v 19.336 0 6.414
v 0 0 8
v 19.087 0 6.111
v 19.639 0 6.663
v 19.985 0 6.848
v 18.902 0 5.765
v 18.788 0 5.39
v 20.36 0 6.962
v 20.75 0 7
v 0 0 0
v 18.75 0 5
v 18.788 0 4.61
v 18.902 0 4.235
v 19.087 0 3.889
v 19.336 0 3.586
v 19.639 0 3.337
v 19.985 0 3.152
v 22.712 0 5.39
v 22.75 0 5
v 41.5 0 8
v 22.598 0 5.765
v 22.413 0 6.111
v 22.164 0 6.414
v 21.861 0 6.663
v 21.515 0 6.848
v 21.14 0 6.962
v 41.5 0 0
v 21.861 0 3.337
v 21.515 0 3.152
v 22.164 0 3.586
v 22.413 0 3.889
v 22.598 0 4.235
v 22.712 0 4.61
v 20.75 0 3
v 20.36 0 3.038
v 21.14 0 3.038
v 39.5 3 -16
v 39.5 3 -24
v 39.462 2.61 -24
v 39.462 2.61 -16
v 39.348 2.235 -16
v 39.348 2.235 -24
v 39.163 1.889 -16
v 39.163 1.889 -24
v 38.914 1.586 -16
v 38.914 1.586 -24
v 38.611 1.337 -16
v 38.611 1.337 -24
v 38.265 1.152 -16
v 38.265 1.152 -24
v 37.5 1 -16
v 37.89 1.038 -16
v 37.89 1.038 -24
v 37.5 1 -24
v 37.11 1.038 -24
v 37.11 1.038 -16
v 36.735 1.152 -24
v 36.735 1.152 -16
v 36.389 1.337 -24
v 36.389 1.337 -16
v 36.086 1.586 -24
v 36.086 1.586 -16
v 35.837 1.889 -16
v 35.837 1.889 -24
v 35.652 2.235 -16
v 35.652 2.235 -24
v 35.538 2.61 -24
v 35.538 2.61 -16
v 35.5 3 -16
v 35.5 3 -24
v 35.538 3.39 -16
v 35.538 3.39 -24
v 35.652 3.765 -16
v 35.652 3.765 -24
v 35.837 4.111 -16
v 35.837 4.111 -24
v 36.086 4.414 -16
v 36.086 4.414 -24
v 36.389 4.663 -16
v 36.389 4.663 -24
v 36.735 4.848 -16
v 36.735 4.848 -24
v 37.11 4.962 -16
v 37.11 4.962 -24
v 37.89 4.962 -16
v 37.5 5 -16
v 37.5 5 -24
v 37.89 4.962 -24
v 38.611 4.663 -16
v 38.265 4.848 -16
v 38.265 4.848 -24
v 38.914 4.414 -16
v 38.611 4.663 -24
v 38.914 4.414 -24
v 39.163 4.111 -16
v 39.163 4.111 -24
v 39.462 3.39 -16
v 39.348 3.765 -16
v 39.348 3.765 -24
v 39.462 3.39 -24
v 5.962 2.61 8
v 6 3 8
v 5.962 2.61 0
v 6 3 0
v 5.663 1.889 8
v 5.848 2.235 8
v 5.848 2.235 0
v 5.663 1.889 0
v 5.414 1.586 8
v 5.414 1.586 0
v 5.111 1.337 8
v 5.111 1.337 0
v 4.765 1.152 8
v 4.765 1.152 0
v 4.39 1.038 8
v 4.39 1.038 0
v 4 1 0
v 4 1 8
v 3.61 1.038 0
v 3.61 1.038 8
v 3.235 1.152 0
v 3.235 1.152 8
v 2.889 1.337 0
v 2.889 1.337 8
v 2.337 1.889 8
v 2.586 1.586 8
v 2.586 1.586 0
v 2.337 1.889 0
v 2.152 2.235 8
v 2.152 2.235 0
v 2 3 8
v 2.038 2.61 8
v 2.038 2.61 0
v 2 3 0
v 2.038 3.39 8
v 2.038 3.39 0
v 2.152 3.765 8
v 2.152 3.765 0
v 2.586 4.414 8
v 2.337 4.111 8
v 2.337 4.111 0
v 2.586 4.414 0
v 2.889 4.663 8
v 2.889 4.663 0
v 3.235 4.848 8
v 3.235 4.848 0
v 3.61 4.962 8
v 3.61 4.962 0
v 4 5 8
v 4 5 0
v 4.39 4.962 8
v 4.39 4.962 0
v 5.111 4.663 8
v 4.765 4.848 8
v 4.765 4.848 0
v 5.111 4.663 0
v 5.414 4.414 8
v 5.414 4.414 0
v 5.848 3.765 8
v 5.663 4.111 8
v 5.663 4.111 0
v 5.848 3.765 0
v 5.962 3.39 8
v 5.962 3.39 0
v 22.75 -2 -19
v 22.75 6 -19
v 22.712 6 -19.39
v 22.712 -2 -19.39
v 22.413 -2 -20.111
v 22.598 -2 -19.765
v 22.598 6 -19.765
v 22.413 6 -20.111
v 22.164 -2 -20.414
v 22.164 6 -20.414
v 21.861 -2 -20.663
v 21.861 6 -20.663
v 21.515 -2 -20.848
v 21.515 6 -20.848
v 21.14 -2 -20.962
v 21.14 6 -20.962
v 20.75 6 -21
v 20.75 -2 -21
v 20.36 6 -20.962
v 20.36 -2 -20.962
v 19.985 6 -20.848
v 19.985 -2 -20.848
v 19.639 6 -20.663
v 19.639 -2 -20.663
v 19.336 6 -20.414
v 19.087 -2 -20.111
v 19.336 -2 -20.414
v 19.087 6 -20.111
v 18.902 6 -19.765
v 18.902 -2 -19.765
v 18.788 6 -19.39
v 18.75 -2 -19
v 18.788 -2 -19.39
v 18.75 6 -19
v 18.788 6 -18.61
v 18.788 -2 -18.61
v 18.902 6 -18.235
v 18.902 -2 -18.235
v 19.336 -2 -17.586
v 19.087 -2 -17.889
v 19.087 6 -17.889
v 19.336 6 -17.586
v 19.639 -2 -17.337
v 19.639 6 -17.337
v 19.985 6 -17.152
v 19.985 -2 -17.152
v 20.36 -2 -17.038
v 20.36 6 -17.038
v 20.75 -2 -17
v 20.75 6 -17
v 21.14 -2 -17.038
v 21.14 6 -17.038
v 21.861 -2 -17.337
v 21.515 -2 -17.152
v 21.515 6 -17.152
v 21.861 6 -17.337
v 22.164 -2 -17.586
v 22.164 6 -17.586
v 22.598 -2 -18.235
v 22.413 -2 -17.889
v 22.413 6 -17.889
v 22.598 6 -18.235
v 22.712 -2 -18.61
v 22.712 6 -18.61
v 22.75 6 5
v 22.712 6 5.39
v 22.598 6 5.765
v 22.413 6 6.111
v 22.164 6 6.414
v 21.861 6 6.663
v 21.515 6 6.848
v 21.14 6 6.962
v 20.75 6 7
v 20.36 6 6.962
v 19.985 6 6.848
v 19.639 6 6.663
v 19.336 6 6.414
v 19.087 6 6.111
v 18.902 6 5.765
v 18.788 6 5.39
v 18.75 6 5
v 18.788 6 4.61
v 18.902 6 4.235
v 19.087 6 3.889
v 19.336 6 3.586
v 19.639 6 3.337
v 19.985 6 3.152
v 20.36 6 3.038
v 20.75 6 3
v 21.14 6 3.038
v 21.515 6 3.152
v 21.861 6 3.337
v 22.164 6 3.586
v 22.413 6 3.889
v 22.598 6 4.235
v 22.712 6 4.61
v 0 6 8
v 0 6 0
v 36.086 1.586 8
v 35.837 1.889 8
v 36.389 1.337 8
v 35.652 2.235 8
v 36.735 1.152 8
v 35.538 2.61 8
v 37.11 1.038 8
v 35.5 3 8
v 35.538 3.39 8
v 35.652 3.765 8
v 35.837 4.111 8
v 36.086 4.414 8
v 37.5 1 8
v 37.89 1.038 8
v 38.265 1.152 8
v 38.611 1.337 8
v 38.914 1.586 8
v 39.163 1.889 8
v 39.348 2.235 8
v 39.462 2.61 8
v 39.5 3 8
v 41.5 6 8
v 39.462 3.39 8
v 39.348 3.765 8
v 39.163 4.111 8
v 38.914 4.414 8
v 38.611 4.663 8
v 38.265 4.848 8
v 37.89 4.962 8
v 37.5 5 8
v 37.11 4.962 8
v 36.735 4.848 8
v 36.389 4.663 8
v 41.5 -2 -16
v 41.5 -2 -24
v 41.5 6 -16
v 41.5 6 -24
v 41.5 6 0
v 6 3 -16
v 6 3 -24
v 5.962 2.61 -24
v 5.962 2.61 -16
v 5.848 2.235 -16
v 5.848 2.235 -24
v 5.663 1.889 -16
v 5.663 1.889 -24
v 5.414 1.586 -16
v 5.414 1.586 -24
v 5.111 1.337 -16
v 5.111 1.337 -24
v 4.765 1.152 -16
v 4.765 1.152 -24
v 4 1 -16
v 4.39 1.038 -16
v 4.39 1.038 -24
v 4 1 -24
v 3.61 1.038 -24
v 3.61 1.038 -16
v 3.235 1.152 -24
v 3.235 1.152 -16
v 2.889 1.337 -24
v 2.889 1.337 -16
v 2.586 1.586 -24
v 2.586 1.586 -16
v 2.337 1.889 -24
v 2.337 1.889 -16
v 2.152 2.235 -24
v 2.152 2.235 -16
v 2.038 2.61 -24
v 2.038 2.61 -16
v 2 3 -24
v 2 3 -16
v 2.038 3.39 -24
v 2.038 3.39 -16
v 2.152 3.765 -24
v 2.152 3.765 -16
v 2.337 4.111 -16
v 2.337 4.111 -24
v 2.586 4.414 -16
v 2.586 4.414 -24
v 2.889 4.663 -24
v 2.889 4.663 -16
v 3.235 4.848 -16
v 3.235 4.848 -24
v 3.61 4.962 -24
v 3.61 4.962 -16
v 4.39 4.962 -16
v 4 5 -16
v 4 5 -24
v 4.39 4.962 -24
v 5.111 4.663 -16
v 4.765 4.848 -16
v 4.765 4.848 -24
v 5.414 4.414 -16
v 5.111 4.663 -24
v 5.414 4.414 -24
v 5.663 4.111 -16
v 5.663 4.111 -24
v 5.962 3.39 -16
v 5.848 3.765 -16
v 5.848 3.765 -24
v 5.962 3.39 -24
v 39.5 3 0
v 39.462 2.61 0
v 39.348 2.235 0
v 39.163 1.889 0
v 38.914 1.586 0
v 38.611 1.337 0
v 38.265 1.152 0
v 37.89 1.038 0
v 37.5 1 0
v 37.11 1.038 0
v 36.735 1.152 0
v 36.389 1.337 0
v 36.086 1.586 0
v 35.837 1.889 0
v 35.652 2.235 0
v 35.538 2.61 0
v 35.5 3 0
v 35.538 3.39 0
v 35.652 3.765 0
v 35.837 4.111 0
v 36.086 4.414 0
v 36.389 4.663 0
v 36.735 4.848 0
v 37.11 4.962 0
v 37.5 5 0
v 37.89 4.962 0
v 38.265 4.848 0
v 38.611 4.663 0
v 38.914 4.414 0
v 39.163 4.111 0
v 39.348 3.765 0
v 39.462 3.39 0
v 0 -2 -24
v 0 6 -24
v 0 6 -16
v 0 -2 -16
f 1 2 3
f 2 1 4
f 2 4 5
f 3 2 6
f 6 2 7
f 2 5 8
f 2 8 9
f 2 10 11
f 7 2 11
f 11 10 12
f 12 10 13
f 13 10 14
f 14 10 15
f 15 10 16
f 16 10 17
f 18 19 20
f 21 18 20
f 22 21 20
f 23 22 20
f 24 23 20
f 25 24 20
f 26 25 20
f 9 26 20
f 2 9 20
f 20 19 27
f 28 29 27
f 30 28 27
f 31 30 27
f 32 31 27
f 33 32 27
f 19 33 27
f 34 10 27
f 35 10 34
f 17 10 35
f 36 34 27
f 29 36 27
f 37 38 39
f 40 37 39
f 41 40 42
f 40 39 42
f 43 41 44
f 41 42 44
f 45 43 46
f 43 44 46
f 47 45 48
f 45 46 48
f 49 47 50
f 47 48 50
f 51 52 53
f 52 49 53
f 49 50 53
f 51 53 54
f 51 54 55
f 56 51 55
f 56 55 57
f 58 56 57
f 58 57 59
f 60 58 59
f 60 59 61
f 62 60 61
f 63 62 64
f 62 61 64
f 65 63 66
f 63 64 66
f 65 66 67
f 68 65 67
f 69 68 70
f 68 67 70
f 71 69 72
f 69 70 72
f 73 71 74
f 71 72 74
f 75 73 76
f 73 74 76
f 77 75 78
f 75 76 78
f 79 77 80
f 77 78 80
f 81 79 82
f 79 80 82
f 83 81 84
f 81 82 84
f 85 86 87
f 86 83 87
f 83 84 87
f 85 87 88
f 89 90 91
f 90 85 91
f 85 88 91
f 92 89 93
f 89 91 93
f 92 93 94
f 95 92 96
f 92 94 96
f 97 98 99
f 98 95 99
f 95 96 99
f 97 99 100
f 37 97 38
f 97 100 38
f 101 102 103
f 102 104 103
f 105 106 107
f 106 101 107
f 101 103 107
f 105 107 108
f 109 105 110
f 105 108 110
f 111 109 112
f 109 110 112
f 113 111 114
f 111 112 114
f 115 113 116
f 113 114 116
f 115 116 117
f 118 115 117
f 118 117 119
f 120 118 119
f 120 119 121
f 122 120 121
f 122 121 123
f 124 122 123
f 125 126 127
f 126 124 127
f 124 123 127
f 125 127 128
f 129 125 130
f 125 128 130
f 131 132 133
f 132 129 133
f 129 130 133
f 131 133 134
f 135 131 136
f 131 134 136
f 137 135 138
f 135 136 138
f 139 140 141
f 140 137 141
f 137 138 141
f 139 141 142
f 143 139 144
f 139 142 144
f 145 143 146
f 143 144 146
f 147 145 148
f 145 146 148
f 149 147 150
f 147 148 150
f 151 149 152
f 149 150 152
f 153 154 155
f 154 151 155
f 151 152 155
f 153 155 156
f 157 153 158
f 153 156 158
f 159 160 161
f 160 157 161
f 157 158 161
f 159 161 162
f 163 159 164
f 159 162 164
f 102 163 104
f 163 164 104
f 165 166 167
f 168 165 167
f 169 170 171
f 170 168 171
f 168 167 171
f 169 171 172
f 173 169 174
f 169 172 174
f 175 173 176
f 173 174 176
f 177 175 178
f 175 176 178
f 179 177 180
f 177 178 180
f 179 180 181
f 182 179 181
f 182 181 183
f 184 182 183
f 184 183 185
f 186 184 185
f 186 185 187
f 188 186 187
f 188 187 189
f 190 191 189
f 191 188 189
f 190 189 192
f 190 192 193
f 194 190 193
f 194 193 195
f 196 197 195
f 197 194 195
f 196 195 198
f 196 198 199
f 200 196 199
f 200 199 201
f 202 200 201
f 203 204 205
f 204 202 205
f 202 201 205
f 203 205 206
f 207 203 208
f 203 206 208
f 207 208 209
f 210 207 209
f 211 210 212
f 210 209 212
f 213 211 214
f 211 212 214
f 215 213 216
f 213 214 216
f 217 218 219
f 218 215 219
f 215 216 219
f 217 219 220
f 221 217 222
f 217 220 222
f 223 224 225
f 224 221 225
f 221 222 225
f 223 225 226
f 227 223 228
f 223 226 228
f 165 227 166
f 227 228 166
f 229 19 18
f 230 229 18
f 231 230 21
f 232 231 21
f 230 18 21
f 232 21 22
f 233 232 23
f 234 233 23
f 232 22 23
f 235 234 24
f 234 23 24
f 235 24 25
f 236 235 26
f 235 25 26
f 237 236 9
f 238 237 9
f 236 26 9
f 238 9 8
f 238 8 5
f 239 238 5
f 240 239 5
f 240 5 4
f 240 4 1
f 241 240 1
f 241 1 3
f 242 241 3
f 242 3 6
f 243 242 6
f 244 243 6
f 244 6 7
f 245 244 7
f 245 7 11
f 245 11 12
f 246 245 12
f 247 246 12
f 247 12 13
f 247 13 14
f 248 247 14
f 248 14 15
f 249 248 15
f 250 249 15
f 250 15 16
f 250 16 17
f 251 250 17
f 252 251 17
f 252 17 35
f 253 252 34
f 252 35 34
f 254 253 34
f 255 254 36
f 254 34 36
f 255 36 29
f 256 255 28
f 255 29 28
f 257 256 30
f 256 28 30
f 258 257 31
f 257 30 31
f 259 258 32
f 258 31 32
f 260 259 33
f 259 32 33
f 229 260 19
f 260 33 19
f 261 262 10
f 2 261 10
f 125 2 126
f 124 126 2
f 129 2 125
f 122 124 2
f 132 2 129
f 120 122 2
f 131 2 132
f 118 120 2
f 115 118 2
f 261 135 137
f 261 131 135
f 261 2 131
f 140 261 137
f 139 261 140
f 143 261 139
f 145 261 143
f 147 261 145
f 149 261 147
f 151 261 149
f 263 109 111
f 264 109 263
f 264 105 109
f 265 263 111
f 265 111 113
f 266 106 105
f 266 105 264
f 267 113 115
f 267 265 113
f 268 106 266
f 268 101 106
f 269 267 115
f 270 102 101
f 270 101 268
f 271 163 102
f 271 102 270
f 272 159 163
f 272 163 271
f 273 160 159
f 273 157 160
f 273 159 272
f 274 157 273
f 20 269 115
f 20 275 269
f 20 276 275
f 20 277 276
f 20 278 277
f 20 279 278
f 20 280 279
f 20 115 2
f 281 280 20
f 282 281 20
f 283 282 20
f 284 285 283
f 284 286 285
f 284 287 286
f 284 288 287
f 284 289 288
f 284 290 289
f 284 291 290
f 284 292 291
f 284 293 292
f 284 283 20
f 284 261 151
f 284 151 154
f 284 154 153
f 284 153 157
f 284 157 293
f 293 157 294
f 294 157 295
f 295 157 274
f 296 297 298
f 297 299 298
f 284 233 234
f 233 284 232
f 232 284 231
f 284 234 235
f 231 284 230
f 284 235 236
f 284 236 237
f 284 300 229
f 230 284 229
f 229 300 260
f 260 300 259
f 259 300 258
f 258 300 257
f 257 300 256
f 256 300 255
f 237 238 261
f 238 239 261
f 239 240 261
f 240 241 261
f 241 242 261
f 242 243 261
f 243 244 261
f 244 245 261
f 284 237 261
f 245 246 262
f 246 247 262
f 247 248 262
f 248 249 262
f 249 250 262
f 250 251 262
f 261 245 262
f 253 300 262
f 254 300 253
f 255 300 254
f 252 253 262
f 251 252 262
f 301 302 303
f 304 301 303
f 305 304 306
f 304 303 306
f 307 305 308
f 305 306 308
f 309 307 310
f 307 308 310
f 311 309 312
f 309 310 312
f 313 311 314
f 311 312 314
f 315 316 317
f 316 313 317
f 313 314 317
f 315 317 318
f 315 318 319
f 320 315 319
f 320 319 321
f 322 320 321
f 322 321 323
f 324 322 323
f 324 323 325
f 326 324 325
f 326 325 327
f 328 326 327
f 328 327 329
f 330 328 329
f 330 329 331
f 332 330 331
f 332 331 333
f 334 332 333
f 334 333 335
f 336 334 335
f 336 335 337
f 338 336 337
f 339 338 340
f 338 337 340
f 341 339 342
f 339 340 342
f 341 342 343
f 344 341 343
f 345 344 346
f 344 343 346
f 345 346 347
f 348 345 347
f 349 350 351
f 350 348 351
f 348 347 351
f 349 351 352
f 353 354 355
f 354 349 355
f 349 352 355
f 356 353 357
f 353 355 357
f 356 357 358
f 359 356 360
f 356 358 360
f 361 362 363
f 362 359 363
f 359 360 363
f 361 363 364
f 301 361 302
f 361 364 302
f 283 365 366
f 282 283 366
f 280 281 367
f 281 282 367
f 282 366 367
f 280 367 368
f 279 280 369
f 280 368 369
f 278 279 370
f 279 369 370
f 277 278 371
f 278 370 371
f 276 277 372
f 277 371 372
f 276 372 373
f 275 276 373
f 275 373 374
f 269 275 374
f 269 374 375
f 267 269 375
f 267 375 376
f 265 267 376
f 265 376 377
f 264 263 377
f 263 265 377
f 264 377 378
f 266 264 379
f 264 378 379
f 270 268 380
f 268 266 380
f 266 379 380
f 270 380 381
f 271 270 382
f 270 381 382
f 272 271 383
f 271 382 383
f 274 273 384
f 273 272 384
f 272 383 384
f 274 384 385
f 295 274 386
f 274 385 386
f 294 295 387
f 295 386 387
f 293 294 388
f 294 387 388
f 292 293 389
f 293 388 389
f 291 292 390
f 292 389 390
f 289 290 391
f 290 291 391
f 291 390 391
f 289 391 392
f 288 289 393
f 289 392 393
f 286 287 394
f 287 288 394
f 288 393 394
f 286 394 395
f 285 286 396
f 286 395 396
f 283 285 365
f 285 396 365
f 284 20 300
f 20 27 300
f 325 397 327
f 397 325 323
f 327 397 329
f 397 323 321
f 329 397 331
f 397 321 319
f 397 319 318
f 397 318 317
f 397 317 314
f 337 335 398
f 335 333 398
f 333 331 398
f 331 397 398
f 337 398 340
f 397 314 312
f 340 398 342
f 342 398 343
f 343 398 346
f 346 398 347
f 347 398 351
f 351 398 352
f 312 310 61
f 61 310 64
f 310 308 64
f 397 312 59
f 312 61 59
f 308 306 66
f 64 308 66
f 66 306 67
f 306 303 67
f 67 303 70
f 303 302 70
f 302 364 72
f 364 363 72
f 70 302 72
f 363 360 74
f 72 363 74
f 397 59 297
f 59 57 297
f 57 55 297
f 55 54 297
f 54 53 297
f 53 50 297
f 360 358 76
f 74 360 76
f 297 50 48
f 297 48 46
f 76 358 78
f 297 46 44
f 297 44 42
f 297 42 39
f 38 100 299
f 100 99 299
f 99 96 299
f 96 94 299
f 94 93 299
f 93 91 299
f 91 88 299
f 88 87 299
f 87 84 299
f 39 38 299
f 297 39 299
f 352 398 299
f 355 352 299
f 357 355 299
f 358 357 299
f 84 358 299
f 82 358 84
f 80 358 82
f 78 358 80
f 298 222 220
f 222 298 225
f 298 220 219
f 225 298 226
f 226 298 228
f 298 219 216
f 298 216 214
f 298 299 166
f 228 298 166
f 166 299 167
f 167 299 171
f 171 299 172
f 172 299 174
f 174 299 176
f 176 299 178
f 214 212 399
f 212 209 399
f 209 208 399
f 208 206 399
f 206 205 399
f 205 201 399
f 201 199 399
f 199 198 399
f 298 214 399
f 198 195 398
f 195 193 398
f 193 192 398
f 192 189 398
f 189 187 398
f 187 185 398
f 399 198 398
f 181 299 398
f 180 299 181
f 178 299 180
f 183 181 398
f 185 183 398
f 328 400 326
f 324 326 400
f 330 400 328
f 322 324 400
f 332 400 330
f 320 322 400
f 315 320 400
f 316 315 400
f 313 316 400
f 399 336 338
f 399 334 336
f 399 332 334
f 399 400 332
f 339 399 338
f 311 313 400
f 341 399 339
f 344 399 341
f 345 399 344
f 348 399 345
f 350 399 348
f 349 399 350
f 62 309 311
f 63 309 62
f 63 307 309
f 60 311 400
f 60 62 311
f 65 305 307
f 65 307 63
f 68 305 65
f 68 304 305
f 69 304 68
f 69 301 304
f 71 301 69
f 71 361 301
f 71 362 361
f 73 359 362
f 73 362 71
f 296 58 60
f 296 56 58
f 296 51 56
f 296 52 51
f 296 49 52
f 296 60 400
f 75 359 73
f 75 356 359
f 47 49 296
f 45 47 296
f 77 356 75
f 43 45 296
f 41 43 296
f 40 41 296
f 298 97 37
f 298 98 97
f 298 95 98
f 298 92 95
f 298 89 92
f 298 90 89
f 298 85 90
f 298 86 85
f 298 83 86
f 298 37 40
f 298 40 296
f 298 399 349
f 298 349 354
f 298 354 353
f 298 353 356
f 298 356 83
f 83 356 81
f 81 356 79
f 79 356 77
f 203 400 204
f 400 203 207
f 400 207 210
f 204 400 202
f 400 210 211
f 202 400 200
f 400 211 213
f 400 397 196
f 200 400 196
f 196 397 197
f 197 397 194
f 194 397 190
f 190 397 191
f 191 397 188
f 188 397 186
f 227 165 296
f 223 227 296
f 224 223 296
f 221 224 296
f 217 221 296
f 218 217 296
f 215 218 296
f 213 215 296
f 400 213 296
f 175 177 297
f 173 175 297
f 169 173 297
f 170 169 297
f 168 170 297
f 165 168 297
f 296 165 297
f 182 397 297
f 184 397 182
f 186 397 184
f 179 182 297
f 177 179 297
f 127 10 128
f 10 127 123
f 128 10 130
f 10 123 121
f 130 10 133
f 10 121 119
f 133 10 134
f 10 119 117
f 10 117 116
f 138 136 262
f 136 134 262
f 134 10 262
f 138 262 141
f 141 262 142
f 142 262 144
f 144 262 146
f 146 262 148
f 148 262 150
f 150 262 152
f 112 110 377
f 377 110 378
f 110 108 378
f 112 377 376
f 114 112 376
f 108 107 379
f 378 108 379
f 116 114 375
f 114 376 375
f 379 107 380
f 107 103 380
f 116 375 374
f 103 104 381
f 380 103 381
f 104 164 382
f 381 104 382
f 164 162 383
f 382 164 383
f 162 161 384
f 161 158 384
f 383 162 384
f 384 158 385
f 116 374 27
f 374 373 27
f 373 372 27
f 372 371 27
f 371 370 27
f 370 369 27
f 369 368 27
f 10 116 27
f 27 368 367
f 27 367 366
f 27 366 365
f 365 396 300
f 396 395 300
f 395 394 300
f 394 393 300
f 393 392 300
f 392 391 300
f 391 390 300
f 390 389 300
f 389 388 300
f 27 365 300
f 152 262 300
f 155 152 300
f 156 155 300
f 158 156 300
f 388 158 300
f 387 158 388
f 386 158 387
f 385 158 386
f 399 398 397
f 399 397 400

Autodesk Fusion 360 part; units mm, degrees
sketch "Sketch1" plane through (0, 0, 0) normal (0, 0, 1) x (1, 0, 0) in component "czniki podstawy z pokryw"
  line L0 (0, 0) -> (41.5, 0)
  line L1 (41.5, 0) -> (41.5, 6)
  line L2 (41.5, 6) -> (0, 6)
  line L3 (0, 6) -> (0, 0)
  line L4 (0, 3) -> (41.5, 3) construction
  circle A0 centre (4, 3) radius 2
  circle A1 centre (37.5, 3) radius 2
  dimension "d1" = 4
  dimension "d2" = 4
  dimension "d3" = 33.5
  dimension "d4" = 4
  dimension "d5" = 4
  dimension "d6" = 3
extrude "Extrude1" add sketch "Sketch1" along normal blind 8 makes body 1 in component "czniki podstawy z pokryw"
sketch "Sketch2" plane through (0, 0, 0) normal (0, -1, 0) x (1, 0, 0) in component "czniki podstawy z pokryw"
  line L0 (0, 0) -> (41.5, 0)
  line L1 (41.5, 0) -> (41.5, 8)
  line L2 (41.5, 8) -> (0, 8)
  line L3 (0, 8) -> (0, 0)
  line L4 (20.75, 0) -> (20.75, 8) construction
  circle A0 centre (20.75, 5) radius 2
  dimension "d9" = 4
  dimension "d10" = 5
extrude "Extrude2" cut sketch "Sketch2" against normal blind 6 contours A0 bodies 1 in component "czniki podstawy z pokryw"
sketch "Sketch1 (2)" plane through (0, 0, 0) normal (0, 0, 1) x (1, 0, 0) in component "czniki podstawy z pokryw dlurzszy"
  line L0 (0, 0) -> (41.5, 0)
  line L1 (41.5, 0) -> (41.5, 6)
  line L2 (41.5, 6) -> (0, 6)
  line L3 (0, 6) -> (0, 0)
  line L4 (0, 3) -> (41.5, 3) construction
  circle A0 centre (4, 3) radius 2
  circle A1 centre (37.5, 3) radius 2
  dimension "d1_1" = 4
  dimension "d2_1" = 4
  dimension "d3_1" = 33.5
  dimension "d4_1" = 4
  dimension "d5_1" = 4
  dimension "d6_1" = 3
extrude "Extrude1'" add sketch "Sketch1 (2)" along normal blind 8 separate body makes body 2 in component "czniki podstawy z pokryw dlurzszy"
sketch "Sketch2 (2)" plane through (0, 0, 0) normal (0, -1, 0) x (1, 0, 0) in component "czniki podstawy z pokryw dlurzszy"
  line L0 (0, 0) -> (41.5, 0)
  line L1 (41.5, 0) -> (41.5, 8)
  line L2 (41.5, 8) -> (0, 8)
  line L3 (0, 8) -> (0, 0)
  line L4 (20.75, 0) -> (20.75, 8) construction
  circle A0 centre (20.75, 5) radius 2
  dimension "d9_1" = 4
  dimension "d10_1" = 5
extrude "Extrude2'" cut sketch "Sketch2 (2)" against normal blind 6 contours A0 bodies 2 in component "czniki podstawy z pokryw dlurzszy"
extrude "Extrude3" add 1 faces at (6.2574, 0, 4.234) along direction (0, -1, 0) blind 2 on bodies 2 bodies 2 in component "czniki podstawy z pokryw dlurzszy"
component "czniki podstawy z pokryw" placed x (1, 0, 0) y (0, 1, 0) z (0, 0, 1) at (0, 0, 0)
component "czniki podstawy z pokryw dlurzszy" placed x (1, 0, 0) y (0, 1, 0) z (0, 0, 1) at (0, 0, -24)
